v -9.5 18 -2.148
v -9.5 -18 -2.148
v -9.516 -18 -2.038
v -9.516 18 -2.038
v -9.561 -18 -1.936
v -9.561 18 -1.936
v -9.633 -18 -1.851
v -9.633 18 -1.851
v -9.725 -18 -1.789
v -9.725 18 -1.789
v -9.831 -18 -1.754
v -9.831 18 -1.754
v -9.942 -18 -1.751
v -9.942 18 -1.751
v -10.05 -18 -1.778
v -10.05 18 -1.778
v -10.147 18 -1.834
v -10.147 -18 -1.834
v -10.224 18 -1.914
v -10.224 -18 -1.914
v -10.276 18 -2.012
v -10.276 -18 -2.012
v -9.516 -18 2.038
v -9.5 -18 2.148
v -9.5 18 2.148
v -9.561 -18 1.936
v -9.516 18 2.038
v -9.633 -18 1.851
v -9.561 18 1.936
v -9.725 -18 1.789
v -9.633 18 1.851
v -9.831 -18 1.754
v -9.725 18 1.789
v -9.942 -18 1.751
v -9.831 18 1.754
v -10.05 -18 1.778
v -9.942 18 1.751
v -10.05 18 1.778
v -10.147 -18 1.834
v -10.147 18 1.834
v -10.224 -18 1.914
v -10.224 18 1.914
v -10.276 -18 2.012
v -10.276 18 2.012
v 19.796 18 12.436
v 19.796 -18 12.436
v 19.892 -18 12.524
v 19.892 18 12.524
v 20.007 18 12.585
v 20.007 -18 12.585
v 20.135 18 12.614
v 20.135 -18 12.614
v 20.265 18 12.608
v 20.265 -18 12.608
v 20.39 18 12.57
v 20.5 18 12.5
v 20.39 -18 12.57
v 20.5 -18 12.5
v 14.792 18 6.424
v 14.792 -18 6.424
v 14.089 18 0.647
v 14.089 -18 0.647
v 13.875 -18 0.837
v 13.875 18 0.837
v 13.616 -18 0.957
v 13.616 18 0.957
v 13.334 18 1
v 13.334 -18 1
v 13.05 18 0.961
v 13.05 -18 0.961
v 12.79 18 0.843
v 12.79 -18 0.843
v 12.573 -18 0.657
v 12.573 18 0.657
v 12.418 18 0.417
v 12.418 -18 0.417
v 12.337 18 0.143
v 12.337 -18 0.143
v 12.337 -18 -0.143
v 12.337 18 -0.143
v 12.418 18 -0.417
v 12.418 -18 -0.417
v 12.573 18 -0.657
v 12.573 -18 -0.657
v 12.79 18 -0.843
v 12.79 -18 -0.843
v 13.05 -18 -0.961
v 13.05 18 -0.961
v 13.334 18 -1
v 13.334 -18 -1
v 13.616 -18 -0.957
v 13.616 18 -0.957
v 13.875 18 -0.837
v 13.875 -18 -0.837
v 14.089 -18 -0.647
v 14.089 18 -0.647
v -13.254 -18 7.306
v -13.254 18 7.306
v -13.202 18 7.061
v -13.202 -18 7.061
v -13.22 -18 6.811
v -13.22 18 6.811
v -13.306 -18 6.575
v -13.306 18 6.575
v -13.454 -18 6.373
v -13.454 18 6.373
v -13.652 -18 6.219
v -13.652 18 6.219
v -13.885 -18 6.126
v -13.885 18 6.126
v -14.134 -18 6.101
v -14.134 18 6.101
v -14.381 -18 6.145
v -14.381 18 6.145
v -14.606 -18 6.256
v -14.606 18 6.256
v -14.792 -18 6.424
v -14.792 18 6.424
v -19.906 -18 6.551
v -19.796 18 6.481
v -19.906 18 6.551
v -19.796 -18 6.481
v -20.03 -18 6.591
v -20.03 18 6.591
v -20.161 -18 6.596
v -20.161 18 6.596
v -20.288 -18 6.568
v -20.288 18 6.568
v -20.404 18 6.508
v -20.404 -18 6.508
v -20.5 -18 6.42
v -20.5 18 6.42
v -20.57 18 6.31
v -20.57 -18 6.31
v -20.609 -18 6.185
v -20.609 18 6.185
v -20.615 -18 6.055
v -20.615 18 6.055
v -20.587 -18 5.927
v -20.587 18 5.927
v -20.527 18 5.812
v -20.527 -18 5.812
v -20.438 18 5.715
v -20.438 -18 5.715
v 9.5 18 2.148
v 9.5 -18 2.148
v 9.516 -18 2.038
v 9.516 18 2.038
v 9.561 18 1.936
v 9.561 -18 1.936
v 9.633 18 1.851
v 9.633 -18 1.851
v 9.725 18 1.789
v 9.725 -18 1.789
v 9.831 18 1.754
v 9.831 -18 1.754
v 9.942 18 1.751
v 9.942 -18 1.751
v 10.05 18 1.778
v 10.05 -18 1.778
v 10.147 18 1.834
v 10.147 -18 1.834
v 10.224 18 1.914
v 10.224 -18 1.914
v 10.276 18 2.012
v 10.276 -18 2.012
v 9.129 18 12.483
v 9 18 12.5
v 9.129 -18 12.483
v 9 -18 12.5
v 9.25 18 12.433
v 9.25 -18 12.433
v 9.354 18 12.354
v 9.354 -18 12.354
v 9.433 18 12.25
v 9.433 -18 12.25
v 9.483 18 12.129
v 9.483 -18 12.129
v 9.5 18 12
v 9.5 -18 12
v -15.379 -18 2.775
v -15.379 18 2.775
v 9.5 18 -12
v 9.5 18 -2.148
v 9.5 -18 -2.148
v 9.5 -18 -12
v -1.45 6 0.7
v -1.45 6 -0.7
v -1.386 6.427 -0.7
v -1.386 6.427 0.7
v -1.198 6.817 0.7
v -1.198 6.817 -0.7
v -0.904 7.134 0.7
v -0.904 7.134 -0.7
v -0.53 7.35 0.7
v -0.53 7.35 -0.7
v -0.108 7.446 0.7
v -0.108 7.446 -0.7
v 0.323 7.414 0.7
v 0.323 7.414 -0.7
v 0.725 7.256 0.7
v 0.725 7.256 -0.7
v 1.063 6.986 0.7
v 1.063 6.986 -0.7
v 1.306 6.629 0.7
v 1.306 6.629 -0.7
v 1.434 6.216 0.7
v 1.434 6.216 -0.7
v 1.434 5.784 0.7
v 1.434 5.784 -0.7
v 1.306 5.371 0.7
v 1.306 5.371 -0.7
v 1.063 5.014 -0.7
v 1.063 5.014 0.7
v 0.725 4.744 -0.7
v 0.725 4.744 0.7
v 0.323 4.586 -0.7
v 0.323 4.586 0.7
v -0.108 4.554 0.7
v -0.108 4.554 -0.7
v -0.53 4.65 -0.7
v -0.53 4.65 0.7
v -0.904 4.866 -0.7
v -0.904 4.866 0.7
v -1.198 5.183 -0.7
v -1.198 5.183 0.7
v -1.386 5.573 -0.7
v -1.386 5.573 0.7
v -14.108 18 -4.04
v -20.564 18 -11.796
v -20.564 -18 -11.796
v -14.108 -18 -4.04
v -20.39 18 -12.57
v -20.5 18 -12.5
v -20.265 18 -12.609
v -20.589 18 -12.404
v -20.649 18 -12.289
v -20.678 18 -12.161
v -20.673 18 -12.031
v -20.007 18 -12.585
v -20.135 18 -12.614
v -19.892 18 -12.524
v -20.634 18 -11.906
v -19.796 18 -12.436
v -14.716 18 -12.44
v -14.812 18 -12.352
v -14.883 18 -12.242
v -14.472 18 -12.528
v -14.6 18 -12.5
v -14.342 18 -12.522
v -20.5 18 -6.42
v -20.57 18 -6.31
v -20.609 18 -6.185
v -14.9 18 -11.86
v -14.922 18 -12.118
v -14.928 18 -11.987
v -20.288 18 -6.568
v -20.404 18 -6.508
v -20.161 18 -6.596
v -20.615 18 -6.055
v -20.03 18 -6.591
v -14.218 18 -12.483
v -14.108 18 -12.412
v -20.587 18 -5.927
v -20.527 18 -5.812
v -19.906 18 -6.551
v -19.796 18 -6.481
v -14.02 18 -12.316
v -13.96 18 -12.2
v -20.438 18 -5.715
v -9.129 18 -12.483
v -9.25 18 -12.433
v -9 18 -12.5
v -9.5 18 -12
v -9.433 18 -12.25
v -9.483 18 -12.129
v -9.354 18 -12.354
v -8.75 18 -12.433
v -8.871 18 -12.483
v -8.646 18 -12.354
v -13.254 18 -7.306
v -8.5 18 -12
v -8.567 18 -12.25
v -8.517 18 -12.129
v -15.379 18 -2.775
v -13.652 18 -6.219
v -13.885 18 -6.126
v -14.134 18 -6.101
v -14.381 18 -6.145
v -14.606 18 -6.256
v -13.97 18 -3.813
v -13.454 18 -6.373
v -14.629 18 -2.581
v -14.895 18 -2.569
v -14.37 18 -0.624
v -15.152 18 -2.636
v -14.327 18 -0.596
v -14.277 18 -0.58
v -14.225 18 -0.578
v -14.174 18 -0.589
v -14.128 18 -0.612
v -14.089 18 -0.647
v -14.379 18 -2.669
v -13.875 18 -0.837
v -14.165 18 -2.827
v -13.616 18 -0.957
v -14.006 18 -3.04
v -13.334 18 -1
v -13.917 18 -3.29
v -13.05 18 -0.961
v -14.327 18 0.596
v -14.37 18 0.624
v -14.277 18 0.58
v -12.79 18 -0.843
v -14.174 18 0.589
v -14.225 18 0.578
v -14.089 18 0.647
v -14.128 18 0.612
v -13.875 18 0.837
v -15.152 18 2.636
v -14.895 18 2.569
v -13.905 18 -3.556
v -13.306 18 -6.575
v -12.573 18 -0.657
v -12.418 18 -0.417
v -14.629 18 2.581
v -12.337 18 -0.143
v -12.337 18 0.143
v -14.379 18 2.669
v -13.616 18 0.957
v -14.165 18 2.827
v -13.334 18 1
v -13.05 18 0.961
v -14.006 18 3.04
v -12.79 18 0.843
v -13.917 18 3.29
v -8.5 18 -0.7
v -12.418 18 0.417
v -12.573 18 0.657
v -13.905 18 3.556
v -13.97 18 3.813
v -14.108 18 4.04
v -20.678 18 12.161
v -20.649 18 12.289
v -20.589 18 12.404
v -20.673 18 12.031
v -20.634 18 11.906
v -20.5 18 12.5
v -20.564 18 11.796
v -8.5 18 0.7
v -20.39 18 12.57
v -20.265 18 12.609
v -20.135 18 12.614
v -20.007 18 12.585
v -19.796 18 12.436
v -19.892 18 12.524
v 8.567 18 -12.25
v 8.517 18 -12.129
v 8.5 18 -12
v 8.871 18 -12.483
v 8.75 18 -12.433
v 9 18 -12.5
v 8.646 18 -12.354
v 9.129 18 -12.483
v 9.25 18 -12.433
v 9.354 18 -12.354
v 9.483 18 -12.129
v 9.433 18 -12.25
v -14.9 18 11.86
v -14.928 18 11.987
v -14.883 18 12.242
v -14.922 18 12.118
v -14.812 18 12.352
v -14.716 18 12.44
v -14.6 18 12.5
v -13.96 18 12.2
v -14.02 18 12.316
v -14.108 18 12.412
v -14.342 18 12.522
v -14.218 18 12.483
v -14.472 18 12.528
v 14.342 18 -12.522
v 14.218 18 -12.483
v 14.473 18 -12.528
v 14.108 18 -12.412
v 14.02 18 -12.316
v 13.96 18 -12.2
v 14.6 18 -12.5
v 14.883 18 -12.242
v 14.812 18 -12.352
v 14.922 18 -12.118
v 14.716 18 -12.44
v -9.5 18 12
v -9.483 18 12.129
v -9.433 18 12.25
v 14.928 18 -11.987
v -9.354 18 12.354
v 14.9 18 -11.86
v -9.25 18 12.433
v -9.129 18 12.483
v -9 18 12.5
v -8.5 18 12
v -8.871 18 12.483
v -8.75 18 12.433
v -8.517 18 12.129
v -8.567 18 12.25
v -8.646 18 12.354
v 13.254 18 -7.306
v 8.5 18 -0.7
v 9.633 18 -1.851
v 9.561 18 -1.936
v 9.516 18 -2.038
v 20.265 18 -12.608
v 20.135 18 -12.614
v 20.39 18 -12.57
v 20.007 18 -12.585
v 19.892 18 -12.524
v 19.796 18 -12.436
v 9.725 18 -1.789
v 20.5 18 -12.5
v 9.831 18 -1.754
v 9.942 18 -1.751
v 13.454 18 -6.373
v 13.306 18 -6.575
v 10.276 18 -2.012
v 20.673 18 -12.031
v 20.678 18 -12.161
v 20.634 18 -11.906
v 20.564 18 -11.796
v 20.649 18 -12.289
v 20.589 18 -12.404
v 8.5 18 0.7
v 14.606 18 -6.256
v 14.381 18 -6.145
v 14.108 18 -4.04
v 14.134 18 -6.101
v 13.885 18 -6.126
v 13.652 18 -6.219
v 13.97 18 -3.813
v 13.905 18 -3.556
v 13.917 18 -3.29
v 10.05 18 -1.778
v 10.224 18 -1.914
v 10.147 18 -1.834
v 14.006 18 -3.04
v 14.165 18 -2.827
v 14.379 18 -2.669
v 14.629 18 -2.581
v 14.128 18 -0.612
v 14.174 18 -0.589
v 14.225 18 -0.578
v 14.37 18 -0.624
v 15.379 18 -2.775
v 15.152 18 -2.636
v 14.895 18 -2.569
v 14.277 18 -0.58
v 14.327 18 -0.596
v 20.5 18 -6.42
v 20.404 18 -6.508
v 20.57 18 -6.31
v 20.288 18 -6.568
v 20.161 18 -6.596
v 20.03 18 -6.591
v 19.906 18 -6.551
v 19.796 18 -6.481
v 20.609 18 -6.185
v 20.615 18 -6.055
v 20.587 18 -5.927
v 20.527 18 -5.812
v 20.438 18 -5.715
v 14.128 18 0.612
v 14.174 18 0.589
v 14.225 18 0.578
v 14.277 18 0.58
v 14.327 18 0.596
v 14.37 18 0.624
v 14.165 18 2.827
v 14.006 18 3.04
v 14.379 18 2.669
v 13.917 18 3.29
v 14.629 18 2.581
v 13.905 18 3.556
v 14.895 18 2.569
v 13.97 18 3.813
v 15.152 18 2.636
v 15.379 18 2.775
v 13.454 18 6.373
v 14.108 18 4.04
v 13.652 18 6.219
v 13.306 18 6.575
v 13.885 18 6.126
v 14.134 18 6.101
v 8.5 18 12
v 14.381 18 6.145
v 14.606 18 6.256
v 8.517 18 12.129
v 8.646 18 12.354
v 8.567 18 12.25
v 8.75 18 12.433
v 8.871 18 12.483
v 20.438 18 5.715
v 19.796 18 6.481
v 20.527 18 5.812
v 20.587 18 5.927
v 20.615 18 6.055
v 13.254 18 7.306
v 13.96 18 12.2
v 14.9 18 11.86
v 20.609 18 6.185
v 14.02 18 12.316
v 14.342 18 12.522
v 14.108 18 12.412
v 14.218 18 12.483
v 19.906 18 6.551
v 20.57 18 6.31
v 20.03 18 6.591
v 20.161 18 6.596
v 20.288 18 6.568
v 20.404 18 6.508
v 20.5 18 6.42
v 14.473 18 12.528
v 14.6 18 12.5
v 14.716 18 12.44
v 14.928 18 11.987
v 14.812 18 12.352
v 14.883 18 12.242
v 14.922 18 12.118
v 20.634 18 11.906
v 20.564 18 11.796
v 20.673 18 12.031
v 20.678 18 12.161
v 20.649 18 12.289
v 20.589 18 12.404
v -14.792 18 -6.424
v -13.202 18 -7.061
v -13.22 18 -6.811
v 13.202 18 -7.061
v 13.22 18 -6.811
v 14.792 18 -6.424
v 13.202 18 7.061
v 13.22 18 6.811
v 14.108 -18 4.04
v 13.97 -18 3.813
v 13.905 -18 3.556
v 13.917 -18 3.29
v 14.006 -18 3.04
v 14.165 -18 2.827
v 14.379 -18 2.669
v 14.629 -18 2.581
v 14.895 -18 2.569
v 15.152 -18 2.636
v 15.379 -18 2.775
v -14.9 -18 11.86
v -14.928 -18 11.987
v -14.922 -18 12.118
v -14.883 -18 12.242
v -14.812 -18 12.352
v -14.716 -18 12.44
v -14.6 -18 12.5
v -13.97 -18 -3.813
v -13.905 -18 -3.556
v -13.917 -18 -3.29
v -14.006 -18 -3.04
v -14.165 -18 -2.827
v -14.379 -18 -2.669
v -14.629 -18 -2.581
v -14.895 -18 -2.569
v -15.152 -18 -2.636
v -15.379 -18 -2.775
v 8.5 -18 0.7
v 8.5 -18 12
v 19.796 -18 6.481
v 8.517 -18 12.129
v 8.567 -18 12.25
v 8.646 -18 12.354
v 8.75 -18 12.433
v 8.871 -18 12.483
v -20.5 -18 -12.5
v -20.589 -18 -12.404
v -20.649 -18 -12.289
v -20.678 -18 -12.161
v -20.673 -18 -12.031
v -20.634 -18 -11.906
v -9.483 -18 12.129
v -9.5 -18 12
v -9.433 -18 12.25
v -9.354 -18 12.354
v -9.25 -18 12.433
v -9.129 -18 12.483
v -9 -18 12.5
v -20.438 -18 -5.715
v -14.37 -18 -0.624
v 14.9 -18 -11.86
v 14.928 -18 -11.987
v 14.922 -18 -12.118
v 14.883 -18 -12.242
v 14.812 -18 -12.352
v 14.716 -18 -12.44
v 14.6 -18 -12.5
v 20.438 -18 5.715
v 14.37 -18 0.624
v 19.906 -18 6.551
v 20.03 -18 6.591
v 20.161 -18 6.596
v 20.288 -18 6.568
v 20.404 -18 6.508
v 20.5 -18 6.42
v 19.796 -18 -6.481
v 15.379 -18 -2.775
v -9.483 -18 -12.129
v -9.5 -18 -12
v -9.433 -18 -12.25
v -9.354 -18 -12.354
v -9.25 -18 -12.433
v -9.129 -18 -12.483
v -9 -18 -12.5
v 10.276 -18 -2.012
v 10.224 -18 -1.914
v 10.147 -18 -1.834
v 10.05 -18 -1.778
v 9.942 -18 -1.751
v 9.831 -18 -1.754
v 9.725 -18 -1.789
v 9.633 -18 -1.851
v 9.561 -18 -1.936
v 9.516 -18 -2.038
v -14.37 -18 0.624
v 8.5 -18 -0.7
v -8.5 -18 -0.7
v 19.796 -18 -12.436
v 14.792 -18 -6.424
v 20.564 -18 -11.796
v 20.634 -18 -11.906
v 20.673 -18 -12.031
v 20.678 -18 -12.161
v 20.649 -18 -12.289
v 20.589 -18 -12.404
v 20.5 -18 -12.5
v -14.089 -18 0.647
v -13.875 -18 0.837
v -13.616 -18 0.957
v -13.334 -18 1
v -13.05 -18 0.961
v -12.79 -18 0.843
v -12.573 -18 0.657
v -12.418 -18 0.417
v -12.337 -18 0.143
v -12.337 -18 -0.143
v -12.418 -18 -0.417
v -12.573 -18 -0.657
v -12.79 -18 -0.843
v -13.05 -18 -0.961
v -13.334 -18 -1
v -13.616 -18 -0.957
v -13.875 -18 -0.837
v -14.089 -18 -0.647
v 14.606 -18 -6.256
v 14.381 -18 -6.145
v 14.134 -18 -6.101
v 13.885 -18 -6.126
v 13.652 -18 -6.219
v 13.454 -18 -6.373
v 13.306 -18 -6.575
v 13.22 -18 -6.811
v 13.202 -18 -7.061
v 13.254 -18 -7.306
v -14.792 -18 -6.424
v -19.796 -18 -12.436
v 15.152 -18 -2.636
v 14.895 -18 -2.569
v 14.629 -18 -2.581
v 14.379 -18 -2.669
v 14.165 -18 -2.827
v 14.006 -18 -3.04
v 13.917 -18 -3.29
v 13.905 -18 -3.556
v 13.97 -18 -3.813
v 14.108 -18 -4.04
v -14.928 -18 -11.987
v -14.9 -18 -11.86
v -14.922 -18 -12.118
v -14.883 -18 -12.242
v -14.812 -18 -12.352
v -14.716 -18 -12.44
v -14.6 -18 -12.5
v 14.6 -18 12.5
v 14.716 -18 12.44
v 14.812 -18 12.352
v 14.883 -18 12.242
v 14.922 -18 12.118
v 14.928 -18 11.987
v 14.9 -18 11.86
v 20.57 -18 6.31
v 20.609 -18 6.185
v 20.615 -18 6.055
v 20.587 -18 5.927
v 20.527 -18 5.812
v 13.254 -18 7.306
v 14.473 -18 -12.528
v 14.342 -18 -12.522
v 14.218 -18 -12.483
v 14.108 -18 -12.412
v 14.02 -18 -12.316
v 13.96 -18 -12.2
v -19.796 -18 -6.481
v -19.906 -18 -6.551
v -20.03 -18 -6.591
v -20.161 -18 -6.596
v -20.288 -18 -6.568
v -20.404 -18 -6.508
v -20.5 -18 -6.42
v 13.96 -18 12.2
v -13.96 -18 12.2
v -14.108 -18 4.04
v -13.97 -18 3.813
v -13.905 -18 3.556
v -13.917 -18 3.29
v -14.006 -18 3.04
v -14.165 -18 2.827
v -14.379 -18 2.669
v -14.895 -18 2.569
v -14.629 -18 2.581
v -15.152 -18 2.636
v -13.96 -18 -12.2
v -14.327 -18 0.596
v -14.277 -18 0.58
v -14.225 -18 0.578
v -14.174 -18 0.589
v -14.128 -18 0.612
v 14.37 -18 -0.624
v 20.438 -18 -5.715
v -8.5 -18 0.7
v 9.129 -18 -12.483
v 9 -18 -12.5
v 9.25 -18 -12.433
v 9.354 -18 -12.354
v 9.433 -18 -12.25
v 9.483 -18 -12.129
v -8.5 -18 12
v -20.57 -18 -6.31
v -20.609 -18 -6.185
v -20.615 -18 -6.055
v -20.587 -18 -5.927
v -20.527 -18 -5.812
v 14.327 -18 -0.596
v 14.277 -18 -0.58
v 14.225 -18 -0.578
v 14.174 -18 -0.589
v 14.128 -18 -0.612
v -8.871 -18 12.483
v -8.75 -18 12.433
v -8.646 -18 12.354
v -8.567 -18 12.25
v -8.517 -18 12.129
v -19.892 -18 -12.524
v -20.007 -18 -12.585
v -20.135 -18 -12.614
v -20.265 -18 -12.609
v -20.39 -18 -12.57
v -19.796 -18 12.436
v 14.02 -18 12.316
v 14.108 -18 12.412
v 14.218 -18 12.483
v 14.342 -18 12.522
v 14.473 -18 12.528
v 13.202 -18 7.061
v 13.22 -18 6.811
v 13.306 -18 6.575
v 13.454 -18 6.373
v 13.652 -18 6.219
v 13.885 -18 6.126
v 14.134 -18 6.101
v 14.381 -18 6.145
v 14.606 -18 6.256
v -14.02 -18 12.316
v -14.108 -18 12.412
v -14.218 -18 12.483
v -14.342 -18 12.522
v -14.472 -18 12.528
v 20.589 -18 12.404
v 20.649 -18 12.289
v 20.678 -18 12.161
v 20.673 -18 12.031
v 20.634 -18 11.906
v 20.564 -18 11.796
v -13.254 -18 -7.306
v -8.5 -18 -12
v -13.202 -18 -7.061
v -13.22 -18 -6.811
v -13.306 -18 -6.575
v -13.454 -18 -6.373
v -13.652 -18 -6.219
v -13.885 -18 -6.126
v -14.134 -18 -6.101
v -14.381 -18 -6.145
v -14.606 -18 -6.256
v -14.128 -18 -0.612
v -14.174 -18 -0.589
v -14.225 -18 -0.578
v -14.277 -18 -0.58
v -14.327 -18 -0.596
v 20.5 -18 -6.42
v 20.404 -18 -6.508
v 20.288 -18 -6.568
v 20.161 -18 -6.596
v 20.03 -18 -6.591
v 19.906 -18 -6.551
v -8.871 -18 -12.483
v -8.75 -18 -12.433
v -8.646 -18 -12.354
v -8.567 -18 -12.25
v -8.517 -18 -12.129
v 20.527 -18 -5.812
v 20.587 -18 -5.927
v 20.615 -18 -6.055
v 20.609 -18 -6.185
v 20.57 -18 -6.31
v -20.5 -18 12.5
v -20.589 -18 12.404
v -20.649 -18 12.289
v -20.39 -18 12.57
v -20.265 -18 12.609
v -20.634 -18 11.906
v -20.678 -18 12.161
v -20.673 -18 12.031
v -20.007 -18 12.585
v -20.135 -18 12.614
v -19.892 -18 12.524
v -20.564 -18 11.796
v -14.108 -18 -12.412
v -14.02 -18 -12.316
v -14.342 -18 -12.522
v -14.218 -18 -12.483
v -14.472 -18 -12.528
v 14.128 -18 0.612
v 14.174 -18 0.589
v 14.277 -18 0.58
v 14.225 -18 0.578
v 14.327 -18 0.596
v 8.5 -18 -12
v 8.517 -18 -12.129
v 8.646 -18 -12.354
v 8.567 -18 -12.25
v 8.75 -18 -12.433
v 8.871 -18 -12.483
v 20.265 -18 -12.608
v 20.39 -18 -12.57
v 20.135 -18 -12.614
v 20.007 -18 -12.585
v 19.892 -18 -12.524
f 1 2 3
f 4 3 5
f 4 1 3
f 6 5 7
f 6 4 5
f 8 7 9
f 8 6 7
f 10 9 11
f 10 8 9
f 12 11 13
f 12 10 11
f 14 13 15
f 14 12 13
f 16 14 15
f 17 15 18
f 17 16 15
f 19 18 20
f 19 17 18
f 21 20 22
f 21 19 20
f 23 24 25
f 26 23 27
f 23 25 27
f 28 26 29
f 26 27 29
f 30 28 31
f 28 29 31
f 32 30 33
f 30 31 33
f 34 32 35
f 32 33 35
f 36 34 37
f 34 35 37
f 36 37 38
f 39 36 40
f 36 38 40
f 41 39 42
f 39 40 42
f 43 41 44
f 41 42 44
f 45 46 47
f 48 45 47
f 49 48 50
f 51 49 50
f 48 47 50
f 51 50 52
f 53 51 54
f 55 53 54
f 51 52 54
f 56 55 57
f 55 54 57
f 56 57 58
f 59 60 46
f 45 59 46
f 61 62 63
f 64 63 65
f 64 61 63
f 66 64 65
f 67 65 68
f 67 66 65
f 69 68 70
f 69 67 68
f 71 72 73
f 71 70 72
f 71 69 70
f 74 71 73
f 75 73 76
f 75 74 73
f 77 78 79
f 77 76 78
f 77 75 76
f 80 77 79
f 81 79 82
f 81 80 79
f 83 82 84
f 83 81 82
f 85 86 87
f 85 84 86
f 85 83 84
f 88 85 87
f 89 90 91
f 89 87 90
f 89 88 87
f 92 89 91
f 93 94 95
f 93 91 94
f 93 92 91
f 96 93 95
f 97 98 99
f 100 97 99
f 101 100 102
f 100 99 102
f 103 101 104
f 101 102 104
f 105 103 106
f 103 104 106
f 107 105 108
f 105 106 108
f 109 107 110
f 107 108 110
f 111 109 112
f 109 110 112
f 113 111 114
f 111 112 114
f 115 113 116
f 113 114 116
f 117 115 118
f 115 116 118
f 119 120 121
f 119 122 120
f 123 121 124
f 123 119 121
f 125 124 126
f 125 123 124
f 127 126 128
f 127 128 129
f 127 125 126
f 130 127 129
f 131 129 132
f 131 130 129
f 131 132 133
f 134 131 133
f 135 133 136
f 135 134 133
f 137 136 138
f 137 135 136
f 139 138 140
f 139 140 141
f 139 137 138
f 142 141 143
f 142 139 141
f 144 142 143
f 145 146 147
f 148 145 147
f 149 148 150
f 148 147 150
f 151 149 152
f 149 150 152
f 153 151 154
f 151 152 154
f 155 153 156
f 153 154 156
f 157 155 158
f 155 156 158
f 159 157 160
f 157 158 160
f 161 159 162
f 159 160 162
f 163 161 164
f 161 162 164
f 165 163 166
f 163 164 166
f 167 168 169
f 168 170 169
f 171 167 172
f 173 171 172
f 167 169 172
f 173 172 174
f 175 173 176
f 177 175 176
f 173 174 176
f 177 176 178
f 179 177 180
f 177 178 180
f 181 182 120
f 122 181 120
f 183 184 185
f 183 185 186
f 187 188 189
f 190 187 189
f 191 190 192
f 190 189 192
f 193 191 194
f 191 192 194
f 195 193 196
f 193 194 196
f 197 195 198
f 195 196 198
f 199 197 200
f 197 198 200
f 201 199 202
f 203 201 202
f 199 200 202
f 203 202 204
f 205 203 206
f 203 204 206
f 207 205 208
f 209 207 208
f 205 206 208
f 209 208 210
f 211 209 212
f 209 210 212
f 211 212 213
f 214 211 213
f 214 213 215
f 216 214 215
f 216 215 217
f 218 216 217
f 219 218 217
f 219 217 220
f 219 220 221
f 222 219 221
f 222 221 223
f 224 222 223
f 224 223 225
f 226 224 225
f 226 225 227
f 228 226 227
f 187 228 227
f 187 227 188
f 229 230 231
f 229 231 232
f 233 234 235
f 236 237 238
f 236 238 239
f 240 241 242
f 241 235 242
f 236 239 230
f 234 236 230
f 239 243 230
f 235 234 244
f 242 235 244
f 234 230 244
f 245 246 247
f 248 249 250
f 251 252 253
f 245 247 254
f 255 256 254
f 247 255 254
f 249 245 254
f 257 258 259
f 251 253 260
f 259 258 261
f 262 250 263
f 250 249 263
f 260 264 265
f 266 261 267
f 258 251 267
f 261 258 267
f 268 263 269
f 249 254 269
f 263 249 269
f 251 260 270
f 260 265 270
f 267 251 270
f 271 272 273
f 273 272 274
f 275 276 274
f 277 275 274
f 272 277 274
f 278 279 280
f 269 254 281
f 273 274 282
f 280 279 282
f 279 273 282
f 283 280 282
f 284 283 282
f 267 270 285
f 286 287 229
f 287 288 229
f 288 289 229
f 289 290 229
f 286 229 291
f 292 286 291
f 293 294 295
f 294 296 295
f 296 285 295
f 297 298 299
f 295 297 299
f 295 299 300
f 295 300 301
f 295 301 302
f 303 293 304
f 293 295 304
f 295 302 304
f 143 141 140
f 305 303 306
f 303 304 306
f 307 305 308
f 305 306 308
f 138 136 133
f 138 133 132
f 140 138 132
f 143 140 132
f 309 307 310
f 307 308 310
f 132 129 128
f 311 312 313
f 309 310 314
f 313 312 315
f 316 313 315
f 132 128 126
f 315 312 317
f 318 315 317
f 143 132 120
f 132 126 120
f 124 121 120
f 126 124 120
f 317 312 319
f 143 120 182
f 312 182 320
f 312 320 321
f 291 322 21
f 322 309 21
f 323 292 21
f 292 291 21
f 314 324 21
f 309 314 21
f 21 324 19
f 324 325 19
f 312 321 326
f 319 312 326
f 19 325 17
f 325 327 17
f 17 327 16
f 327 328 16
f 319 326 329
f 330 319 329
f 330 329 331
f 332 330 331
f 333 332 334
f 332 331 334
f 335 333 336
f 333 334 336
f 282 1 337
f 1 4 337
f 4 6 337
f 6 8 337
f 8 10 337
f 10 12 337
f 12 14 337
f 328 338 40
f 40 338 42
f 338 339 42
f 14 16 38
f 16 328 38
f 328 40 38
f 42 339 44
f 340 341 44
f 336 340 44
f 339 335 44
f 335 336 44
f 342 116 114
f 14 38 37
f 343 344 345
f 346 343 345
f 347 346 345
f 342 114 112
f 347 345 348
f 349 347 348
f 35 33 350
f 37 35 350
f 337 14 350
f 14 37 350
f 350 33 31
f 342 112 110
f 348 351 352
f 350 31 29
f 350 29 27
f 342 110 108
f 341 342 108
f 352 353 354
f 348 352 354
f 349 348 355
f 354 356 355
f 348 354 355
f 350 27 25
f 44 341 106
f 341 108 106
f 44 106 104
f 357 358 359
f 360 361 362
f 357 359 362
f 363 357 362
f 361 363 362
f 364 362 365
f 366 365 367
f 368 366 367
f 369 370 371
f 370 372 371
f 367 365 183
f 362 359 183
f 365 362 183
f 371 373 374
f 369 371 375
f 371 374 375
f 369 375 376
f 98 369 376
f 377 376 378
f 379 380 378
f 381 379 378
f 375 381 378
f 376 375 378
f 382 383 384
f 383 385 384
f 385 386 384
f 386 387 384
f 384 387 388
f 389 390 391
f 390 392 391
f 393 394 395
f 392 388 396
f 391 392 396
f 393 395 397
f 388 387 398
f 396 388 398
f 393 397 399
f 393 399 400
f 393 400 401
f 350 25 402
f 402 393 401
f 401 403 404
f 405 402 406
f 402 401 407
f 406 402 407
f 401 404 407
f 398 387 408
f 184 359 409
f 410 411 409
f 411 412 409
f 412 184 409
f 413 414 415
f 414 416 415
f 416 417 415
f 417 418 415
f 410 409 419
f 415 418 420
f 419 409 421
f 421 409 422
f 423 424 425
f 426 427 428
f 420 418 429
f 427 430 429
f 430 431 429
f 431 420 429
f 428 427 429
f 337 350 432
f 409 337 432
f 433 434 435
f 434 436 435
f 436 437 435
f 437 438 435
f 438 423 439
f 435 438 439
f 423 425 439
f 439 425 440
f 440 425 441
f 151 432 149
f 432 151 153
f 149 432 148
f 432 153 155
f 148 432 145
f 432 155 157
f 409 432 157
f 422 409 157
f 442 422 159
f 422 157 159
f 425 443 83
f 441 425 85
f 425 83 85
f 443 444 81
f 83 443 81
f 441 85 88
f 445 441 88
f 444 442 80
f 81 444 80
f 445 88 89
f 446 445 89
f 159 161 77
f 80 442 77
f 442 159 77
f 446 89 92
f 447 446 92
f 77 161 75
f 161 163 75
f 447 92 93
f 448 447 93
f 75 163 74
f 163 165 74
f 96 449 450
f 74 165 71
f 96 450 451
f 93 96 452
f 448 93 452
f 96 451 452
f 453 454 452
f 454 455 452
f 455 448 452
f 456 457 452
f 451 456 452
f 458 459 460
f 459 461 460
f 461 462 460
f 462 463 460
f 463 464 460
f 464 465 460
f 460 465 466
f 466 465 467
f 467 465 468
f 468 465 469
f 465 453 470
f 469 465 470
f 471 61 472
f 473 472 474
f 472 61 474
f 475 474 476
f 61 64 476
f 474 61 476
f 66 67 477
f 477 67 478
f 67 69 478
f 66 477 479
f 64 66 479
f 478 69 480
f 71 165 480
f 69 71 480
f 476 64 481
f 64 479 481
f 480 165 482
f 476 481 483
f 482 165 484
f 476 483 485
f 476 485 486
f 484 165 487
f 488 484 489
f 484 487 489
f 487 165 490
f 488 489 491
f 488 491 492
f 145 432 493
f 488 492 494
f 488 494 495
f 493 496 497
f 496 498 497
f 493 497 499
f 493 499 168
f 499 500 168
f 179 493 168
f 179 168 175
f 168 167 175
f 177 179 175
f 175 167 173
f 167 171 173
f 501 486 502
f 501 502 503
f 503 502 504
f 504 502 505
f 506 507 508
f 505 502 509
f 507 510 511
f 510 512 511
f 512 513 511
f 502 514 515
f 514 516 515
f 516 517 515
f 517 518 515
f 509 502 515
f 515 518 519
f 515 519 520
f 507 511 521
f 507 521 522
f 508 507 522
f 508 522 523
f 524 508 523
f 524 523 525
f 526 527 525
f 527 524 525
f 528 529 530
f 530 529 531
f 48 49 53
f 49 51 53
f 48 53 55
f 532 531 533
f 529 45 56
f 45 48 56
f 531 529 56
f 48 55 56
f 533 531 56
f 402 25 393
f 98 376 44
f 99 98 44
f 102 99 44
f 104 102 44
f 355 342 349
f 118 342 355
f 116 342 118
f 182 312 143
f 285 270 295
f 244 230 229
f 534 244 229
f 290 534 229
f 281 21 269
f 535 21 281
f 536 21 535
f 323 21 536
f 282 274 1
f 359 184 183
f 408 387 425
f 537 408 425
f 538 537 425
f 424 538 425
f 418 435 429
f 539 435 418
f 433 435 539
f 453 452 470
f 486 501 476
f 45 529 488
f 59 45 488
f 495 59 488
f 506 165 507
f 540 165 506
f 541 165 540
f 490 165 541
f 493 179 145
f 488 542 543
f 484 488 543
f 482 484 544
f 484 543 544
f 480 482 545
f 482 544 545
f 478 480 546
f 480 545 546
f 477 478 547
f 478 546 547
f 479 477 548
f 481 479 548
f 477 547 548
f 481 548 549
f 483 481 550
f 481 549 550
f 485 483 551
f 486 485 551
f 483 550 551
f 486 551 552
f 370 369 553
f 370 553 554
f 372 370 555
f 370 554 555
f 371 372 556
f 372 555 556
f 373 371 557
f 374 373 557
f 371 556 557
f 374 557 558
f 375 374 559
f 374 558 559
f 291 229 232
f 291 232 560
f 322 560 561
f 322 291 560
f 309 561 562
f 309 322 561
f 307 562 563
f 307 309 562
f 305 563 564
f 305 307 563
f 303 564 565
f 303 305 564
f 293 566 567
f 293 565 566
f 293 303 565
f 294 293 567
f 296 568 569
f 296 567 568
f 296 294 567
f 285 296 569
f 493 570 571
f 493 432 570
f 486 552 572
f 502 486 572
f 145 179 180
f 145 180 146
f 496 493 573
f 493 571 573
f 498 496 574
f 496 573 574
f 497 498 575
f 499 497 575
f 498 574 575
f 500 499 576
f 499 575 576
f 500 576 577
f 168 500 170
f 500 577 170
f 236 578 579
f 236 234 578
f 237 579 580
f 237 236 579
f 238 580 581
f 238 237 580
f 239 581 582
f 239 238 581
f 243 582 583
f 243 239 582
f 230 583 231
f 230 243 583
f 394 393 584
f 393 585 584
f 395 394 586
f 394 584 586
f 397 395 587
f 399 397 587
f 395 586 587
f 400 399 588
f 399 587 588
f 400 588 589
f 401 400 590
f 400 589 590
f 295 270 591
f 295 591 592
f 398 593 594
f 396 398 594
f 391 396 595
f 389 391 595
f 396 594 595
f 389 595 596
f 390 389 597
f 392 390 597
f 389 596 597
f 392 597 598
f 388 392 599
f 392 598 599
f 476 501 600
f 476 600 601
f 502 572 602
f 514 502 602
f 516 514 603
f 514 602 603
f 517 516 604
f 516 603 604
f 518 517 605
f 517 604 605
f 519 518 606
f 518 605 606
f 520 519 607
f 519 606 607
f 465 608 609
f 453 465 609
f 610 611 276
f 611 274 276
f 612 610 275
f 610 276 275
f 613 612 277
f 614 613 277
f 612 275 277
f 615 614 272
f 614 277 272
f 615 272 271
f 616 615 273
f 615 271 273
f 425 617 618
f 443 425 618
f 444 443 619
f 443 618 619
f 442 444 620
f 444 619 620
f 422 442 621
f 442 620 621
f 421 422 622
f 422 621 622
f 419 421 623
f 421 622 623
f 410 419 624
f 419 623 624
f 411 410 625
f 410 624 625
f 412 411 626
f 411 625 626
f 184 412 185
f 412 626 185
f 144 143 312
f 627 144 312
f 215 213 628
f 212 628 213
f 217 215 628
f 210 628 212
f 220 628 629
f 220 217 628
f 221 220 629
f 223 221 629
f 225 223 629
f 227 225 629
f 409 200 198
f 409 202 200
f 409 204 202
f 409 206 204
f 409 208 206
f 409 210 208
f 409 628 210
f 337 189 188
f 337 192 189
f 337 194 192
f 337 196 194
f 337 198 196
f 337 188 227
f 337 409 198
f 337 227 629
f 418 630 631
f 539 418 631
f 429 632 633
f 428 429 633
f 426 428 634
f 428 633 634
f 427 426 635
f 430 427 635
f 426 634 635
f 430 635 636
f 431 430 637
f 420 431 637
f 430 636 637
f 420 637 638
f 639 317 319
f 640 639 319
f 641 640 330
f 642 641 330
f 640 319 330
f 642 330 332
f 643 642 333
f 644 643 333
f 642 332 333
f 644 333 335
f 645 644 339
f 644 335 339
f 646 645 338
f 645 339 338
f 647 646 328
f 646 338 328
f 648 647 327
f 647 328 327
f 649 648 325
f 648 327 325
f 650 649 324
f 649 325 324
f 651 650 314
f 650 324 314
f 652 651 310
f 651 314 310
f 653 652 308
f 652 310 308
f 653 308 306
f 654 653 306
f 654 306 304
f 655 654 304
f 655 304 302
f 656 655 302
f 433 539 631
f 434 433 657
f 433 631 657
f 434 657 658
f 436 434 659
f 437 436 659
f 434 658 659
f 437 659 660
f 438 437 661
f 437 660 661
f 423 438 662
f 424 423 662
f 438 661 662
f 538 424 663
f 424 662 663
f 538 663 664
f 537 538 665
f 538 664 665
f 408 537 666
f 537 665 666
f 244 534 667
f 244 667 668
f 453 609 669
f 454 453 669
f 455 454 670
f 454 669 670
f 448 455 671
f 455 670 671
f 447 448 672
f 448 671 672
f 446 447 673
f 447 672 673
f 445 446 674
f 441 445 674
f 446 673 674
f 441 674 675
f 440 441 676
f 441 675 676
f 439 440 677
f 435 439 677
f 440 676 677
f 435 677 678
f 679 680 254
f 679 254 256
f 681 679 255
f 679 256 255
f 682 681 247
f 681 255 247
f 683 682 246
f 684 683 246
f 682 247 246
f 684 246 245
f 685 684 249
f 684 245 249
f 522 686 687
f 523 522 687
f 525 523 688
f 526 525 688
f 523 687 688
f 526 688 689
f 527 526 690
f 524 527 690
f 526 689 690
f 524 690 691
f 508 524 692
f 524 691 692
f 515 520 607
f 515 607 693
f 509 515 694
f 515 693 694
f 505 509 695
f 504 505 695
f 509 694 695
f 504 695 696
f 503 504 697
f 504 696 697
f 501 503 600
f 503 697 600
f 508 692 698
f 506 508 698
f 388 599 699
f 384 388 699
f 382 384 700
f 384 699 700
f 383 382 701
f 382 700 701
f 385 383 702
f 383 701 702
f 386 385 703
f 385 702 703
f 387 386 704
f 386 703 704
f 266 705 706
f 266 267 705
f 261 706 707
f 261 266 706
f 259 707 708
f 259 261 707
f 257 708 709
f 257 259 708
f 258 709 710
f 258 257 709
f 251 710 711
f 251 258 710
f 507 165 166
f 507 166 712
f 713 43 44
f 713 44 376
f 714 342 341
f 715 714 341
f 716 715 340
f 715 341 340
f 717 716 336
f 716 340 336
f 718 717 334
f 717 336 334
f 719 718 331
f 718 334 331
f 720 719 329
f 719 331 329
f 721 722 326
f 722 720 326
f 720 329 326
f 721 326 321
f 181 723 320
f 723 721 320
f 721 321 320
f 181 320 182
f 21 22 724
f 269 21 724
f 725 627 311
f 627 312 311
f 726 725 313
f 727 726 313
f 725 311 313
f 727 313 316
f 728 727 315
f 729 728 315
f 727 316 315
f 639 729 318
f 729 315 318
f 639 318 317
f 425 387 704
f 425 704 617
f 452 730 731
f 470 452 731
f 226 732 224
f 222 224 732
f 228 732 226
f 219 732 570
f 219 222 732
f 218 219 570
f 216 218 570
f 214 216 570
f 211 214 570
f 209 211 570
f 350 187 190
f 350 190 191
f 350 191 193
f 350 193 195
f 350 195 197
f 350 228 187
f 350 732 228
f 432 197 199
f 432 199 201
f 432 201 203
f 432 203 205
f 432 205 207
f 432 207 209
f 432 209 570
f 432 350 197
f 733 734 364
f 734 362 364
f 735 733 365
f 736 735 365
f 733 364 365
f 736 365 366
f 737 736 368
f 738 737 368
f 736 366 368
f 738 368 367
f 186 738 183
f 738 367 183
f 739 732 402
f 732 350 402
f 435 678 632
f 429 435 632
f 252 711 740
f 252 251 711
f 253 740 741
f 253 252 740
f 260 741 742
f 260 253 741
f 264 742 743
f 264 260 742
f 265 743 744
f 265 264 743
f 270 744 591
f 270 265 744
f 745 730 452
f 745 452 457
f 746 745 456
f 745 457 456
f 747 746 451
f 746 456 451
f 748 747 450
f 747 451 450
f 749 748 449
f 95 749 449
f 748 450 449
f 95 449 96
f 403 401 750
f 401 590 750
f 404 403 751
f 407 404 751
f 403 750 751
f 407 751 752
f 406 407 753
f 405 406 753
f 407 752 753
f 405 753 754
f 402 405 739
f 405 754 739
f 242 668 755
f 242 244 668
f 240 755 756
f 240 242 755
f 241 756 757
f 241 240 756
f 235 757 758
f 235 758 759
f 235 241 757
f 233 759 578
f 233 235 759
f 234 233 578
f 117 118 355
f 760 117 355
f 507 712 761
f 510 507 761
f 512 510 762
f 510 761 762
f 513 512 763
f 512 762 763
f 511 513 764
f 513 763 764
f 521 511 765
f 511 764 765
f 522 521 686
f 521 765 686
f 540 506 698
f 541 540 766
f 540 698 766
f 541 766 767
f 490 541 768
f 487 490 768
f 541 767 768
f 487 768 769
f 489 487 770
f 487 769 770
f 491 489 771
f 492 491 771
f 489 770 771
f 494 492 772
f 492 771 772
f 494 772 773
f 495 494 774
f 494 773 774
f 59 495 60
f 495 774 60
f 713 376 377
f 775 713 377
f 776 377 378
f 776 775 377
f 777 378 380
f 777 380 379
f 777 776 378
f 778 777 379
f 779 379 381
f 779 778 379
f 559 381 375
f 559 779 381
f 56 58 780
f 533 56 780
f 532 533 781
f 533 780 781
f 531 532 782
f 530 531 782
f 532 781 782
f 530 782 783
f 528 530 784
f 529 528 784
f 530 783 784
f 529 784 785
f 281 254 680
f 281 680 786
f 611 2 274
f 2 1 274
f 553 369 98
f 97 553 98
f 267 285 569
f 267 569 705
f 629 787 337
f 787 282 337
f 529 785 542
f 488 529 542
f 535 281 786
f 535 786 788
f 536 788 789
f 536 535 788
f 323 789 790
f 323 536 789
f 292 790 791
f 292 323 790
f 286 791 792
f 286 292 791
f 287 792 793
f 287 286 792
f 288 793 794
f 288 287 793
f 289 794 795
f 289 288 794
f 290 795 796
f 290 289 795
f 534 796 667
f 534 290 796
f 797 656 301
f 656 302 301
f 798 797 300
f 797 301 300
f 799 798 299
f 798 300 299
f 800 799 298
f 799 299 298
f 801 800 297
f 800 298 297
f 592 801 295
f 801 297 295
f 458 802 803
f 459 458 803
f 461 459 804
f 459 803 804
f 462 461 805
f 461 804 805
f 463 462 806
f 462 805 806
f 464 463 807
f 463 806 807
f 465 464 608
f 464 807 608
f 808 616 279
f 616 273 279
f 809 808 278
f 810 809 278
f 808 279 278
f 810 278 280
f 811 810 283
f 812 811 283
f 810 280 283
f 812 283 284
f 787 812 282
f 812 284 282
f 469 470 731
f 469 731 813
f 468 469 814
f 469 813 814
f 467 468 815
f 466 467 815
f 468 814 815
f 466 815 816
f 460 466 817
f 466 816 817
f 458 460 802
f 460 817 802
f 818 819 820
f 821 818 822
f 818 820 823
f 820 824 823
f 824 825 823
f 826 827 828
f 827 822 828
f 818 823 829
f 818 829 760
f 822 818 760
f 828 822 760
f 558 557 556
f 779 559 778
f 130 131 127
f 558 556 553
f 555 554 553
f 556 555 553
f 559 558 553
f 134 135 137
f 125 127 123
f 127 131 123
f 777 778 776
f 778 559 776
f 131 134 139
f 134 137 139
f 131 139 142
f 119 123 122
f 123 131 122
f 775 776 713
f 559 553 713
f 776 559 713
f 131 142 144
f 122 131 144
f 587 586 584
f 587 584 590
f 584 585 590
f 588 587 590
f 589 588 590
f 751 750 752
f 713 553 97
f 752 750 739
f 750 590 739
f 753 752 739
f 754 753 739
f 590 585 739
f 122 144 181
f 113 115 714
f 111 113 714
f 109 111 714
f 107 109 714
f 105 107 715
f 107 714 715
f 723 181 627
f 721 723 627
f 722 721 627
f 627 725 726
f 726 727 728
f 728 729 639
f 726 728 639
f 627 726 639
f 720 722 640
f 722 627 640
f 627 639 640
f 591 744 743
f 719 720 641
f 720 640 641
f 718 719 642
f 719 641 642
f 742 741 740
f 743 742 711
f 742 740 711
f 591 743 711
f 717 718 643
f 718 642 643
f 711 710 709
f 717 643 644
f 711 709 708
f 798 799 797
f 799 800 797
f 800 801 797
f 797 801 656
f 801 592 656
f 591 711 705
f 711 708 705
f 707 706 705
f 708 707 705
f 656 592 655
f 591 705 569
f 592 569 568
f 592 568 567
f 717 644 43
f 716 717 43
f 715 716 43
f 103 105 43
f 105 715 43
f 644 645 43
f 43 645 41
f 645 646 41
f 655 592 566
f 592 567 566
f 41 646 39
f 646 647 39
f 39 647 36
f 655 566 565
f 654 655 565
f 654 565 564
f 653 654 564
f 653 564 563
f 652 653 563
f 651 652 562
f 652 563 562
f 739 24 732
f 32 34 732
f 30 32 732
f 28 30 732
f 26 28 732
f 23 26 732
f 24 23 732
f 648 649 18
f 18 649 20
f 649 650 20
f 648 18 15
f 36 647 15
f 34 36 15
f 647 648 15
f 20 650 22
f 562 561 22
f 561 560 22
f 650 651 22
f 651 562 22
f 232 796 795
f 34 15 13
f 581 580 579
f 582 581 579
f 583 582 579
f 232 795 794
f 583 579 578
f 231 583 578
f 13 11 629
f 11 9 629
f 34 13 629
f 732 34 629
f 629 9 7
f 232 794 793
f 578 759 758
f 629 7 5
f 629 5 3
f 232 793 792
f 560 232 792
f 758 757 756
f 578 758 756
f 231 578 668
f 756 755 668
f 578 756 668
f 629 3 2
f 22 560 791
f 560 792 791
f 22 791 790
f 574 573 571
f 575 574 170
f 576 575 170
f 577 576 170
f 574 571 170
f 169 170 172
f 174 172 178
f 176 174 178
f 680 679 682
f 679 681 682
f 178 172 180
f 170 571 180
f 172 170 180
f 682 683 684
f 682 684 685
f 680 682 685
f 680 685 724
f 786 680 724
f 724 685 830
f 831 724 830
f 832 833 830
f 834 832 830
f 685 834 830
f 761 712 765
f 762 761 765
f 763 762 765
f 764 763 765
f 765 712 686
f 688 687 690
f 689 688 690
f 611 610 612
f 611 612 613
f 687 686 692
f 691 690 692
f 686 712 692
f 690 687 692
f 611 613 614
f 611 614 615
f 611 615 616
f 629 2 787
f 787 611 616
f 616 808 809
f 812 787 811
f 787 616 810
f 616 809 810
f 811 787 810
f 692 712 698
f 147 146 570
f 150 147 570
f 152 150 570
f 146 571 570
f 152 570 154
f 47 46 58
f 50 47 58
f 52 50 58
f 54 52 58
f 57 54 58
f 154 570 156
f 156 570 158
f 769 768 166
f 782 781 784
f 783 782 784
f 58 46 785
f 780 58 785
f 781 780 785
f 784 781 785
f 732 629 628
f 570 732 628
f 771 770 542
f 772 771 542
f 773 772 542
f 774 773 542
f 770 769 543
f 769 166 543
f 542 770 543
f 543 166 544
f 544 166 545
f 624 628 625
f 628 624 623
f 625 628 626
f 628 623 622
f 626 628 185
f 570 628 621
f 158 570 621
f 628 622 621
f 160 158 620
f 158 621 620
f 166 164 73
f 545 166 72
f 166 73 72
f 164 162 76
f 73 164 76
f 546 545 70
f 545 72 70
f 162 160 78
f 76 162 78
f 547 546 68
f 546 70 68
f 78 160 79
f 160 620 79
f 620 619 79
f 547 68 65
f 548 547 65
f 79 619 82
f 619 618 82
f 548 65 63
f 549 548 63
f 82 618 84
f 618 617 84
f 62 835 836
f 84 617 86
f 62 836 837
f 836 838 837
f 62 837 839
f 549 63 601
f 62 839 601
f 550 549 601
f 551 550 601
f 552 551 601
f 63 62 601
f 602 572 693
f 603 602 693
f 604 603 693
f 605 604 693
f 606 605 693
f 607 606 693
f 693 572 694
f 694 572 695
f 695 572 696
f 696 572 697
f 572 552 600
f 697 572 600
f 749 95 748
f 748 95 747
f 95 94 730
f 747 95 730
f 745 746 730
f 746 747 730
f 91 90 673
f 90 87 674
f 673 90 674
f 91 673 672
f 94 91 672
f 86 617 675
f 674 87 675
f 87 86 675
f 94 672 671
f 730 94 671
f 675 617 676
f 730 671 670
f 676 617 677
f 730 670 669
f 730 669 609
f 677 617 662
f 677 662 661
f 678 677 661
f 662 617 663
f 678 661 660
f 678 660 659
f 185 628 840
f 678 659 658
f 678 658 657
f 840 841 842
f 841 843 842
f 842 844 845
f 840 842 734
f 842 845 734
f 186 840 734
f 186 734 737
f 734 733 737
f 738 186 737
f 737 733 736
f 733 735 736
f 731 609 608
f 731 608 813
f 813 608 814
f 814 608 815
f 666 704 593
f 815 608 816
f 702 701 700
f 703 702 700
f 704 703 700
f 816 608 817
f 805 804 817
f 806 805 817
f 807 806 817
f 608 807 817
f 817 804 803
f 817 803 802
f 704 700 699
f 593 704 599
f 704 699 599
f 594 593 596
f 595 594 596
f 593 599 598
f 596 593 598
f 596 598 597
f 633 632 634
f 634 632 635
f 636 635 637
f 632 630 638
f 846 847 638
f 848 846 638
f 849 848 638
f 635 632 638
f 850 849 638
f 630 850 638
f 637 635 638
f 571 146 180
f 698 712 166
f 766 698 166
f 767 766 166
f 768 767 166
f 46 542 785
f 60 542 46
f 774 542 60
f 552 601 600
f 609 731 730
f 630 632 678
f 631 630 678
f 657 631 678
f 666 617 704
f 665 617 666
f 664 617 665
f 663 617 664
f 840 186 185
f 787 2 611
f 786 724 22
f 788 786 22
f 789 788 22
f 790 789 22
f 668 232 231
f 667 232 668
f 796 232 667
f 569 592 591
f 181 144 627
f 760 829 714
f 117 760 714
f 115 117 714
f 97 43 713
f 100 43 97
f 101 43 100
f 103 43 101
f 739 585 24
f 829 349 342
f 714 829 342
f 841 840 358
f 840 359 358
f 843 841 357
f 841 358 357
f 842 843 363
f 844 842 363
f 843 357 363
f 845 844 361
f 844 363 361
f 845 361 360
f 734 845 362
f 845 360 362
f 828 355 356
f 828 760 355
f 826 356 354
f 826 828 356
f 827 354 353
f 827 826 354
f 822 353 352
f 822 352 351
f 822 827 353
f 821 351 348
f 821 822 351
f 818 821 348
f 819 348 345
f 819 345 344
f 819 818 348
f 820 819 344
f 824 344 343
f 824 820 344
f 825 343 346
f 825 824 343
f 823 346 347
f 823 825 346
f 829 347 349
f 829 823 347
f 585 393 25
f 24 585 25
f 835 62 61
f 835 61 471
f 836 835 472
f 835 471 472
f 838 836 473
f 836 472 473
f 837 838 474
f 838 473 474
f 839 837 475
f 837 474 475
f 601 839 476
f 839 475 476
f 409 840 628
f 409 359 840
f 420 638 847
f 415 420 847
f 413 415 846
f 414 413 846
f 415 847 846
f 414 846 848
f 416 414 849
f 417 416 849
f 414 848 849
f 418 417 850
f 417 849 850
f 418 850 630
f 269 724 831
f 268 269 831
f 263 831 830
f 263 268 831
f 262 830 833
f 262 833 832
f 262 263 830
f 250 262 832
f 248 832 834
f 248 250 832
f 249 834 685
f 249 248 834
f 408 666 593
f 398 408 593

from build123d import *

# Parameters (mm, degrees)
INNER_HALF_DEPTH          = 18
FLANGES_REACH             = 25.885
FLANGES_DIRECTION_2_REACH = 25.885
FILLET1_R                 = 0.5
FILLET1_OF_MIRROR1_R      = 0.5
MIRROR3_START             = -18
MIRROR3_DEPTH             = 36
SKETCH3_R                 = 1
INNER_CIRCLE_DEPTH        = 44.391544118
M3_5X0_6_TAPPED_HOLE1_D   = 2.9
FILLET3_R                 = 0.2
FILLET2_R                 = 0.5


# Read off the part's stored shape, not the designer's step: Mirror3
with BuildPart() as part:
    # Sketch1 → INNER HALF (new, symmetric)
    with BuildSketch(Plane(origin=(0, 0, 0), x_dir=(1, 0, 0), z_dir=(0, 1, 0))):
        Polygon((-8.5, 0.7), (0, 0.7), (0, -0.7), (-8.5, -0.7), (-8.5, -12.5), (-9.5, -12.5), (-9.5, 12.5), (-8.5, 12.5), align=None)
    inner_half = extrude(amount=INNER_HALF_DEPTH, both=True)

    # Mirror2: INNER HALF across plane
    add(inner_half.mirror(Plane(origin=(0, 0, 0), x_dir=(0, 0, 1), z_dir=(1, 0, 0))))

    # FLANGES: up to this face of the body (flat: up to its plane)
    flanges_end = Plane(part.part.faces().sort_by_distance((0, 18, 0))[0])
    # Sketch2 → FLANGES (add, up to the picked face)
    with BuildSketch(Plane(origin=(0, 0, 0), x_dir=(1, 0, 0), z_dir=(0, 1, 0)), mode=Mode.PRIVATE) as flanges_sk1:
        with BuildLine():
            Line((-10.276164759, 2.012372382), (-14.129794052, 12.670018723))
            Line((-14.129794052, 12.670018723), (-15.070205948, 12.329981277))
            Line((-15.070205948, 12.329981277), (-13.253629293, 7.306033701))
            ThreePointArc((-13.253629293, 7.306033701), (-13.652352407, 6.219223699), (-14.791703546, 6.42419951))
            Line((-14.791703546, 6.42419951), (-20.115720252, 12.819889161))
            Line((-20.115720252, 12.819889161), (-20.884279748, 12.180110839))
            Line((-20.884279748, 12.180110839), (-14.108296454, 4.040187803))
            ThreePointArc((-14.108296454, 4.040187803), (-14.164853061, 2.826744492), (-15.378508849, 2.774947314))
            Line((-15.378508849, 2.774947314), (-20.178606195, 6.802707227))
            Line((-20.178606195, 6.802707227), (-20.821393805, 6.036662784))
            Line((-20.821393805, 6.036662784), (-13.627179245, 0))
            Line((-13.627179245, 0), (-9.5, 0))
            Line((-9.5, 0), (-9.5, 2.14838736))
            ThreePointArc((-9.5, 2.14838736), (-9.830956186, 1.754391228), (-10.276164759, 2.012372382))
        make_face()
    flanges_tool1 = split(extrude(flanges_sk1.sketch, amount=FLANGES_REACH, mode=Mode.PRIVATE), bisect_by=flanges_end, keep=Keep.BOTH, mode=Mode.PRIVATE)
    flanges = flanges_tool1.solids().sort_by(Axis((-14.387215, 0, -5.095322), (0, 1, 0)))[0]
    add(flanges)

    # FLANGES direction 2: up to this face of the body (flat: up to its plane)
    flanges_direction_2_end = Plane(part.part.faces().sort_by_distance((0, -18, 0))[0])
    # Sketch2 → FLANGES direction 2 (add, up to the picked face)
    with BuildSketch(Plane(origin=(0, 0, 0), x_dir=(1, 0, 0), z_dir=(0, 1, 0)), mode=Mode.PRIVATE) as flanges_direction_2_sk1:
        with BuildLine():
            Line((-10.276164759, 2.012372382), (-14.129794052, 12.670018723))
            Line((-14.129794052, 12.670018723), (-15.070205948, 12.329981277))
            Line((-15.070205948, 12.329981277), (-13.253629293, 7.306033701))
            ThreePointArc((-13.253629293, 7.306033701), (-13.652352407, 6.219223699), (-14.791703546, 6.42419951))
            Line((-14.791703546, 6.42419951), (-20.115720252, 12.819889161))
            Line((-20.115720252, 12.819889161), (-20.884279748, 12.180110839))
            Line((-20.884279748, 12.180110839), (-14.108296454, 4.040187803))
            ThreePointArc((-14.108296454, 4.040187803), (-14.164853061, 2.826744492), (-15.378508849, 2.774947314))
            Line((-15.378508849, 2.774947314), (-20.178606195, 6.802707227))
            Line((-20.178606195, 6.802707227), (-20.821393805, 6.036662784))
            Line((-20.821393805, 6.036662784), (-13.627179245, 0))
            Line((-13.627179245, 0), (-9.5, 0))
            Line((-9.5, 0), (-9.5, 2.14838736))
            ThreePointArc((-9.5, 2.14838736), (-9.830956186, 1.754391228), (-10.276164759, 2.012372382))
        make_face()
    flanges_direction_2_tool1 = split(extrude(flanges_direction_2_sk1.sketch, amount=-FLANGES_DIRECTION_2_REACH, mode=Mode.PRIVATE), bisect_by=flanges_direction_2_end, keep=Keep.BOTH, mode=Mode.PRIVATE)
    flanges_direction_2 = flanges_direction_2_tool1.solids().sort_by(Axis((-14.387215, 0, -5.095322), (0, -1, 0)))[0]
    add(flanges_direction_2)

    # Fillet1
    fillet1_edges = [part.edges().sort_by_distance(p)[0] for p in [
        (-20.821393805, 0, -6.036662784),
        (-20.178606195, 0, -6.802707227),
        (-20.115720252, 0, -12.819889161),
        (-20.884279748, 0, -12.180110839),
        (-14.129794052, 0, -12.670018723),
        (-15.070205948, 0, -12.329981277),
    ]]
    fillet(fillet1_edges, radius=FILLET1_R - 0.0001)  # a hair under: the kernel refuses the full size

    # Mirror1: FLANGES, FLANGES direction 2 across plane
    add(flanges.mirror(Plane.XY))
    add(flanges_direction_2.mirror(Plane.XY))

    # Fillet1 of Mirror1
    fillet1_of_mirror1_edges = [part.edges().sort_by_distance(p)[0] for p in [
        (-20.821393805, 0, 6.036662784),
        (-20.178606195, 0, 6.802707227),
        (-20.115720252, 0, 12.819889161),
        (-20.884279748, 0, 12.180110839),
        (-14.129794052, 0, 12.670018723),
        (-15.070205948, 0, 12.329981277),
    ]]
    fillet(fillet1_of_mirror1_edges, radius=FILLET1_OF_MIRROR1_R - 0.0001)  # a hair under: the kernel refuses the full size

    # Mirror3 outline → Mirror3 (add)
    with BuildSketch(Plane(origin=(0, 0, 0), x_dir=(1, 0, 0), z_dir=(0, 1, 0)).offset(MIRROR3_START)):
        with BuildLine():
            ThreePointArc((14.6, 12.5), (14.217716854, 12.482501258), (13.959775329, 12.199812774))
            Line((13.959775329, 12.199812774), (10.276164759, 2.012372382))
            ThreePointArc((10.276164759, 2.012372382), (9.830956186, 1.754391228), (9.5, 2.14838736))
            Line((9.5, 2.14838736), (9.5, -2.14838736))
            ThreePointArc((9.5, -2.14838736), (9.830956186, -1.754391228), (10.276164759, -2.012372382))
            Line((10.276164759, -2.012372382), (13.959775329, -12.199812774))
            ThreePointArc((13.959775329, -12.199812774), (14.217716854, -12.482501258), (14.6, -12.5))
            ThreePointArc((14.6, -12.5), (14.882688484, -12.242058475), (14.900187226, -11.859775329))
            Line((14.900187226, -11.859775329), (13.253629293, -7.306033701))
            ThreePointArc((13.253629293, -7.306033701), (13.652352407, -6.219223699), (14.791703546, -6.42419951))
            Line((14.791703546, -6.42419951), (19.795831091, -12.435609413))
            ThreePointArc((19.795831091, -12.435609413), (20.134579818, -12.613642863), (20.5, -12.5))
            ThreePointArc((20.5, -12.5), (20.67803345, -12.161251273), (20.564390587, -11.795831091))
            Line((20.564390587, -11.795831091), (14.108296454, -4.040187803))
            ThreePointArc((14.108296454, -4.040187803), (14.164853061, -2.826744492), (15.378508849, -2.774947314))
            Line((15.378508849, -2.774947314), (19.795583974, -6.481313422))
            ThreePointArc((19.795583974, -6.481313422), (20.16055565, -6.59638855), (20.5, -6.419685006))
            ThreePointArc((20.5, -6.419685006), (20.615075127, -6.054713329), (20.438371583, -5.715268979))
            Line((20.438371583, -5.715268979), (13.627179245, 0))
            Line((13.627179245, 0), (20.438371583, 5.715268979))
            ThreePointArc((20.438371583, 5.715268979), (20.615075127, 6.054713329), (20.5, 6.419685006))
            ThreePointArc((20.5, 6.419685006), (20.16055565, 6.59638855), (19.795583974, 6.481313422))
            Line((19.795583974, 6.481313422), (15.378508849, 2.774947314))
            ThreePointArc((15.378508849, 2.774947314), (14.164853061, 2.826744492), (14.108296454, 4.040187803))
            Line((14.108296454, 4.040187803), (20.564390587, 11.795831091))
            ThreePointArc((20.564390587, 11.795831091), (20.67803345, 12.161251273), (20.5, 12.5))
            ThreePointArc((20.5, 12.5), (20.134579818, 12.613642863), (19.795831091, 12.435609413))
            Line((19.795831091, 12.435609413), (14.791703546, 6.42419951))
            ThreePointArc((14.791703546, 6.42419951), (13.652352407, 6.219223699), (13.253629293, 7.306033701))
            Line((13.253629293, 7.306033701), (14.900187226, 11.859775329))
            ThreePointArc((14.900187226, 11.859775329), (14.882688484, 12.242058475), (14.6, 12.5))
        make_face()
    extrude(amount=MIRROR3_DEPTH)

    # Sketch3 → INNER CIRCLE (cut, symmetric)
    with BuildSketch(Plane(origin=(0, 18, 0), x_dir=(1, 0, 0), z_dir=(0, 1, 0))):
        with Locations((-13.327179245, 0)):
            Circle(SKETCH3_R)
    inner_circle = extrude(amount=INNER_CIRCLE_DEPTH, both=True, mode=Mode.SUBTRACT)

    # Mirror6: INNER CIRCLE across plane
    add(inner_circle.mirror(Plane(origin=(0, 0, 0), x_dir=(0, 0, 1), z_dir=(1, 0, 0))), mode=Mode.SUBTRACT)

    # M3.5x0.6 Tapped Hole1 (through all)
    with Locations(Plane.XY.offset(0.7)):
        with Locations((0, 6)):
            Hole(M3_5X0_6_TAPPED_HOLE1_D / 2)

    # Fillet3
    fillet3_edges = [part.edges().sort_by_distance(p)[0] for p in [
        (-14.202798531, 0, 0.483001931),
        (-14.202798531, 0, -0.483001931),
        (14.202798531, 0, 0.483001931),
        (14.202798531, 0, -0.483001931),
    ]]
    fillet(fillet3_edges, radius=FILLET3_R)

    # Fillet2
    fillet2_edges = [part.edges().sort_by_distance(p)[0] for p in [
        (-8.5, 0, 12.5),
        (-9.5, 0, 12.5),
        (-8.5, 0, -12.5),
        (-9.5, 0, -12.5),
        (9.5, 0, 12.5),
        (8.5, 0, 12.5),
        (9.5, 0, -12.5),
        (8.5, 0, -12.5),
    ]]
    fillet(fillet2_edges, radius=FILLET2_R - 0.0001)  # a hair under: the kernel refuses the full size


solid = part.part
